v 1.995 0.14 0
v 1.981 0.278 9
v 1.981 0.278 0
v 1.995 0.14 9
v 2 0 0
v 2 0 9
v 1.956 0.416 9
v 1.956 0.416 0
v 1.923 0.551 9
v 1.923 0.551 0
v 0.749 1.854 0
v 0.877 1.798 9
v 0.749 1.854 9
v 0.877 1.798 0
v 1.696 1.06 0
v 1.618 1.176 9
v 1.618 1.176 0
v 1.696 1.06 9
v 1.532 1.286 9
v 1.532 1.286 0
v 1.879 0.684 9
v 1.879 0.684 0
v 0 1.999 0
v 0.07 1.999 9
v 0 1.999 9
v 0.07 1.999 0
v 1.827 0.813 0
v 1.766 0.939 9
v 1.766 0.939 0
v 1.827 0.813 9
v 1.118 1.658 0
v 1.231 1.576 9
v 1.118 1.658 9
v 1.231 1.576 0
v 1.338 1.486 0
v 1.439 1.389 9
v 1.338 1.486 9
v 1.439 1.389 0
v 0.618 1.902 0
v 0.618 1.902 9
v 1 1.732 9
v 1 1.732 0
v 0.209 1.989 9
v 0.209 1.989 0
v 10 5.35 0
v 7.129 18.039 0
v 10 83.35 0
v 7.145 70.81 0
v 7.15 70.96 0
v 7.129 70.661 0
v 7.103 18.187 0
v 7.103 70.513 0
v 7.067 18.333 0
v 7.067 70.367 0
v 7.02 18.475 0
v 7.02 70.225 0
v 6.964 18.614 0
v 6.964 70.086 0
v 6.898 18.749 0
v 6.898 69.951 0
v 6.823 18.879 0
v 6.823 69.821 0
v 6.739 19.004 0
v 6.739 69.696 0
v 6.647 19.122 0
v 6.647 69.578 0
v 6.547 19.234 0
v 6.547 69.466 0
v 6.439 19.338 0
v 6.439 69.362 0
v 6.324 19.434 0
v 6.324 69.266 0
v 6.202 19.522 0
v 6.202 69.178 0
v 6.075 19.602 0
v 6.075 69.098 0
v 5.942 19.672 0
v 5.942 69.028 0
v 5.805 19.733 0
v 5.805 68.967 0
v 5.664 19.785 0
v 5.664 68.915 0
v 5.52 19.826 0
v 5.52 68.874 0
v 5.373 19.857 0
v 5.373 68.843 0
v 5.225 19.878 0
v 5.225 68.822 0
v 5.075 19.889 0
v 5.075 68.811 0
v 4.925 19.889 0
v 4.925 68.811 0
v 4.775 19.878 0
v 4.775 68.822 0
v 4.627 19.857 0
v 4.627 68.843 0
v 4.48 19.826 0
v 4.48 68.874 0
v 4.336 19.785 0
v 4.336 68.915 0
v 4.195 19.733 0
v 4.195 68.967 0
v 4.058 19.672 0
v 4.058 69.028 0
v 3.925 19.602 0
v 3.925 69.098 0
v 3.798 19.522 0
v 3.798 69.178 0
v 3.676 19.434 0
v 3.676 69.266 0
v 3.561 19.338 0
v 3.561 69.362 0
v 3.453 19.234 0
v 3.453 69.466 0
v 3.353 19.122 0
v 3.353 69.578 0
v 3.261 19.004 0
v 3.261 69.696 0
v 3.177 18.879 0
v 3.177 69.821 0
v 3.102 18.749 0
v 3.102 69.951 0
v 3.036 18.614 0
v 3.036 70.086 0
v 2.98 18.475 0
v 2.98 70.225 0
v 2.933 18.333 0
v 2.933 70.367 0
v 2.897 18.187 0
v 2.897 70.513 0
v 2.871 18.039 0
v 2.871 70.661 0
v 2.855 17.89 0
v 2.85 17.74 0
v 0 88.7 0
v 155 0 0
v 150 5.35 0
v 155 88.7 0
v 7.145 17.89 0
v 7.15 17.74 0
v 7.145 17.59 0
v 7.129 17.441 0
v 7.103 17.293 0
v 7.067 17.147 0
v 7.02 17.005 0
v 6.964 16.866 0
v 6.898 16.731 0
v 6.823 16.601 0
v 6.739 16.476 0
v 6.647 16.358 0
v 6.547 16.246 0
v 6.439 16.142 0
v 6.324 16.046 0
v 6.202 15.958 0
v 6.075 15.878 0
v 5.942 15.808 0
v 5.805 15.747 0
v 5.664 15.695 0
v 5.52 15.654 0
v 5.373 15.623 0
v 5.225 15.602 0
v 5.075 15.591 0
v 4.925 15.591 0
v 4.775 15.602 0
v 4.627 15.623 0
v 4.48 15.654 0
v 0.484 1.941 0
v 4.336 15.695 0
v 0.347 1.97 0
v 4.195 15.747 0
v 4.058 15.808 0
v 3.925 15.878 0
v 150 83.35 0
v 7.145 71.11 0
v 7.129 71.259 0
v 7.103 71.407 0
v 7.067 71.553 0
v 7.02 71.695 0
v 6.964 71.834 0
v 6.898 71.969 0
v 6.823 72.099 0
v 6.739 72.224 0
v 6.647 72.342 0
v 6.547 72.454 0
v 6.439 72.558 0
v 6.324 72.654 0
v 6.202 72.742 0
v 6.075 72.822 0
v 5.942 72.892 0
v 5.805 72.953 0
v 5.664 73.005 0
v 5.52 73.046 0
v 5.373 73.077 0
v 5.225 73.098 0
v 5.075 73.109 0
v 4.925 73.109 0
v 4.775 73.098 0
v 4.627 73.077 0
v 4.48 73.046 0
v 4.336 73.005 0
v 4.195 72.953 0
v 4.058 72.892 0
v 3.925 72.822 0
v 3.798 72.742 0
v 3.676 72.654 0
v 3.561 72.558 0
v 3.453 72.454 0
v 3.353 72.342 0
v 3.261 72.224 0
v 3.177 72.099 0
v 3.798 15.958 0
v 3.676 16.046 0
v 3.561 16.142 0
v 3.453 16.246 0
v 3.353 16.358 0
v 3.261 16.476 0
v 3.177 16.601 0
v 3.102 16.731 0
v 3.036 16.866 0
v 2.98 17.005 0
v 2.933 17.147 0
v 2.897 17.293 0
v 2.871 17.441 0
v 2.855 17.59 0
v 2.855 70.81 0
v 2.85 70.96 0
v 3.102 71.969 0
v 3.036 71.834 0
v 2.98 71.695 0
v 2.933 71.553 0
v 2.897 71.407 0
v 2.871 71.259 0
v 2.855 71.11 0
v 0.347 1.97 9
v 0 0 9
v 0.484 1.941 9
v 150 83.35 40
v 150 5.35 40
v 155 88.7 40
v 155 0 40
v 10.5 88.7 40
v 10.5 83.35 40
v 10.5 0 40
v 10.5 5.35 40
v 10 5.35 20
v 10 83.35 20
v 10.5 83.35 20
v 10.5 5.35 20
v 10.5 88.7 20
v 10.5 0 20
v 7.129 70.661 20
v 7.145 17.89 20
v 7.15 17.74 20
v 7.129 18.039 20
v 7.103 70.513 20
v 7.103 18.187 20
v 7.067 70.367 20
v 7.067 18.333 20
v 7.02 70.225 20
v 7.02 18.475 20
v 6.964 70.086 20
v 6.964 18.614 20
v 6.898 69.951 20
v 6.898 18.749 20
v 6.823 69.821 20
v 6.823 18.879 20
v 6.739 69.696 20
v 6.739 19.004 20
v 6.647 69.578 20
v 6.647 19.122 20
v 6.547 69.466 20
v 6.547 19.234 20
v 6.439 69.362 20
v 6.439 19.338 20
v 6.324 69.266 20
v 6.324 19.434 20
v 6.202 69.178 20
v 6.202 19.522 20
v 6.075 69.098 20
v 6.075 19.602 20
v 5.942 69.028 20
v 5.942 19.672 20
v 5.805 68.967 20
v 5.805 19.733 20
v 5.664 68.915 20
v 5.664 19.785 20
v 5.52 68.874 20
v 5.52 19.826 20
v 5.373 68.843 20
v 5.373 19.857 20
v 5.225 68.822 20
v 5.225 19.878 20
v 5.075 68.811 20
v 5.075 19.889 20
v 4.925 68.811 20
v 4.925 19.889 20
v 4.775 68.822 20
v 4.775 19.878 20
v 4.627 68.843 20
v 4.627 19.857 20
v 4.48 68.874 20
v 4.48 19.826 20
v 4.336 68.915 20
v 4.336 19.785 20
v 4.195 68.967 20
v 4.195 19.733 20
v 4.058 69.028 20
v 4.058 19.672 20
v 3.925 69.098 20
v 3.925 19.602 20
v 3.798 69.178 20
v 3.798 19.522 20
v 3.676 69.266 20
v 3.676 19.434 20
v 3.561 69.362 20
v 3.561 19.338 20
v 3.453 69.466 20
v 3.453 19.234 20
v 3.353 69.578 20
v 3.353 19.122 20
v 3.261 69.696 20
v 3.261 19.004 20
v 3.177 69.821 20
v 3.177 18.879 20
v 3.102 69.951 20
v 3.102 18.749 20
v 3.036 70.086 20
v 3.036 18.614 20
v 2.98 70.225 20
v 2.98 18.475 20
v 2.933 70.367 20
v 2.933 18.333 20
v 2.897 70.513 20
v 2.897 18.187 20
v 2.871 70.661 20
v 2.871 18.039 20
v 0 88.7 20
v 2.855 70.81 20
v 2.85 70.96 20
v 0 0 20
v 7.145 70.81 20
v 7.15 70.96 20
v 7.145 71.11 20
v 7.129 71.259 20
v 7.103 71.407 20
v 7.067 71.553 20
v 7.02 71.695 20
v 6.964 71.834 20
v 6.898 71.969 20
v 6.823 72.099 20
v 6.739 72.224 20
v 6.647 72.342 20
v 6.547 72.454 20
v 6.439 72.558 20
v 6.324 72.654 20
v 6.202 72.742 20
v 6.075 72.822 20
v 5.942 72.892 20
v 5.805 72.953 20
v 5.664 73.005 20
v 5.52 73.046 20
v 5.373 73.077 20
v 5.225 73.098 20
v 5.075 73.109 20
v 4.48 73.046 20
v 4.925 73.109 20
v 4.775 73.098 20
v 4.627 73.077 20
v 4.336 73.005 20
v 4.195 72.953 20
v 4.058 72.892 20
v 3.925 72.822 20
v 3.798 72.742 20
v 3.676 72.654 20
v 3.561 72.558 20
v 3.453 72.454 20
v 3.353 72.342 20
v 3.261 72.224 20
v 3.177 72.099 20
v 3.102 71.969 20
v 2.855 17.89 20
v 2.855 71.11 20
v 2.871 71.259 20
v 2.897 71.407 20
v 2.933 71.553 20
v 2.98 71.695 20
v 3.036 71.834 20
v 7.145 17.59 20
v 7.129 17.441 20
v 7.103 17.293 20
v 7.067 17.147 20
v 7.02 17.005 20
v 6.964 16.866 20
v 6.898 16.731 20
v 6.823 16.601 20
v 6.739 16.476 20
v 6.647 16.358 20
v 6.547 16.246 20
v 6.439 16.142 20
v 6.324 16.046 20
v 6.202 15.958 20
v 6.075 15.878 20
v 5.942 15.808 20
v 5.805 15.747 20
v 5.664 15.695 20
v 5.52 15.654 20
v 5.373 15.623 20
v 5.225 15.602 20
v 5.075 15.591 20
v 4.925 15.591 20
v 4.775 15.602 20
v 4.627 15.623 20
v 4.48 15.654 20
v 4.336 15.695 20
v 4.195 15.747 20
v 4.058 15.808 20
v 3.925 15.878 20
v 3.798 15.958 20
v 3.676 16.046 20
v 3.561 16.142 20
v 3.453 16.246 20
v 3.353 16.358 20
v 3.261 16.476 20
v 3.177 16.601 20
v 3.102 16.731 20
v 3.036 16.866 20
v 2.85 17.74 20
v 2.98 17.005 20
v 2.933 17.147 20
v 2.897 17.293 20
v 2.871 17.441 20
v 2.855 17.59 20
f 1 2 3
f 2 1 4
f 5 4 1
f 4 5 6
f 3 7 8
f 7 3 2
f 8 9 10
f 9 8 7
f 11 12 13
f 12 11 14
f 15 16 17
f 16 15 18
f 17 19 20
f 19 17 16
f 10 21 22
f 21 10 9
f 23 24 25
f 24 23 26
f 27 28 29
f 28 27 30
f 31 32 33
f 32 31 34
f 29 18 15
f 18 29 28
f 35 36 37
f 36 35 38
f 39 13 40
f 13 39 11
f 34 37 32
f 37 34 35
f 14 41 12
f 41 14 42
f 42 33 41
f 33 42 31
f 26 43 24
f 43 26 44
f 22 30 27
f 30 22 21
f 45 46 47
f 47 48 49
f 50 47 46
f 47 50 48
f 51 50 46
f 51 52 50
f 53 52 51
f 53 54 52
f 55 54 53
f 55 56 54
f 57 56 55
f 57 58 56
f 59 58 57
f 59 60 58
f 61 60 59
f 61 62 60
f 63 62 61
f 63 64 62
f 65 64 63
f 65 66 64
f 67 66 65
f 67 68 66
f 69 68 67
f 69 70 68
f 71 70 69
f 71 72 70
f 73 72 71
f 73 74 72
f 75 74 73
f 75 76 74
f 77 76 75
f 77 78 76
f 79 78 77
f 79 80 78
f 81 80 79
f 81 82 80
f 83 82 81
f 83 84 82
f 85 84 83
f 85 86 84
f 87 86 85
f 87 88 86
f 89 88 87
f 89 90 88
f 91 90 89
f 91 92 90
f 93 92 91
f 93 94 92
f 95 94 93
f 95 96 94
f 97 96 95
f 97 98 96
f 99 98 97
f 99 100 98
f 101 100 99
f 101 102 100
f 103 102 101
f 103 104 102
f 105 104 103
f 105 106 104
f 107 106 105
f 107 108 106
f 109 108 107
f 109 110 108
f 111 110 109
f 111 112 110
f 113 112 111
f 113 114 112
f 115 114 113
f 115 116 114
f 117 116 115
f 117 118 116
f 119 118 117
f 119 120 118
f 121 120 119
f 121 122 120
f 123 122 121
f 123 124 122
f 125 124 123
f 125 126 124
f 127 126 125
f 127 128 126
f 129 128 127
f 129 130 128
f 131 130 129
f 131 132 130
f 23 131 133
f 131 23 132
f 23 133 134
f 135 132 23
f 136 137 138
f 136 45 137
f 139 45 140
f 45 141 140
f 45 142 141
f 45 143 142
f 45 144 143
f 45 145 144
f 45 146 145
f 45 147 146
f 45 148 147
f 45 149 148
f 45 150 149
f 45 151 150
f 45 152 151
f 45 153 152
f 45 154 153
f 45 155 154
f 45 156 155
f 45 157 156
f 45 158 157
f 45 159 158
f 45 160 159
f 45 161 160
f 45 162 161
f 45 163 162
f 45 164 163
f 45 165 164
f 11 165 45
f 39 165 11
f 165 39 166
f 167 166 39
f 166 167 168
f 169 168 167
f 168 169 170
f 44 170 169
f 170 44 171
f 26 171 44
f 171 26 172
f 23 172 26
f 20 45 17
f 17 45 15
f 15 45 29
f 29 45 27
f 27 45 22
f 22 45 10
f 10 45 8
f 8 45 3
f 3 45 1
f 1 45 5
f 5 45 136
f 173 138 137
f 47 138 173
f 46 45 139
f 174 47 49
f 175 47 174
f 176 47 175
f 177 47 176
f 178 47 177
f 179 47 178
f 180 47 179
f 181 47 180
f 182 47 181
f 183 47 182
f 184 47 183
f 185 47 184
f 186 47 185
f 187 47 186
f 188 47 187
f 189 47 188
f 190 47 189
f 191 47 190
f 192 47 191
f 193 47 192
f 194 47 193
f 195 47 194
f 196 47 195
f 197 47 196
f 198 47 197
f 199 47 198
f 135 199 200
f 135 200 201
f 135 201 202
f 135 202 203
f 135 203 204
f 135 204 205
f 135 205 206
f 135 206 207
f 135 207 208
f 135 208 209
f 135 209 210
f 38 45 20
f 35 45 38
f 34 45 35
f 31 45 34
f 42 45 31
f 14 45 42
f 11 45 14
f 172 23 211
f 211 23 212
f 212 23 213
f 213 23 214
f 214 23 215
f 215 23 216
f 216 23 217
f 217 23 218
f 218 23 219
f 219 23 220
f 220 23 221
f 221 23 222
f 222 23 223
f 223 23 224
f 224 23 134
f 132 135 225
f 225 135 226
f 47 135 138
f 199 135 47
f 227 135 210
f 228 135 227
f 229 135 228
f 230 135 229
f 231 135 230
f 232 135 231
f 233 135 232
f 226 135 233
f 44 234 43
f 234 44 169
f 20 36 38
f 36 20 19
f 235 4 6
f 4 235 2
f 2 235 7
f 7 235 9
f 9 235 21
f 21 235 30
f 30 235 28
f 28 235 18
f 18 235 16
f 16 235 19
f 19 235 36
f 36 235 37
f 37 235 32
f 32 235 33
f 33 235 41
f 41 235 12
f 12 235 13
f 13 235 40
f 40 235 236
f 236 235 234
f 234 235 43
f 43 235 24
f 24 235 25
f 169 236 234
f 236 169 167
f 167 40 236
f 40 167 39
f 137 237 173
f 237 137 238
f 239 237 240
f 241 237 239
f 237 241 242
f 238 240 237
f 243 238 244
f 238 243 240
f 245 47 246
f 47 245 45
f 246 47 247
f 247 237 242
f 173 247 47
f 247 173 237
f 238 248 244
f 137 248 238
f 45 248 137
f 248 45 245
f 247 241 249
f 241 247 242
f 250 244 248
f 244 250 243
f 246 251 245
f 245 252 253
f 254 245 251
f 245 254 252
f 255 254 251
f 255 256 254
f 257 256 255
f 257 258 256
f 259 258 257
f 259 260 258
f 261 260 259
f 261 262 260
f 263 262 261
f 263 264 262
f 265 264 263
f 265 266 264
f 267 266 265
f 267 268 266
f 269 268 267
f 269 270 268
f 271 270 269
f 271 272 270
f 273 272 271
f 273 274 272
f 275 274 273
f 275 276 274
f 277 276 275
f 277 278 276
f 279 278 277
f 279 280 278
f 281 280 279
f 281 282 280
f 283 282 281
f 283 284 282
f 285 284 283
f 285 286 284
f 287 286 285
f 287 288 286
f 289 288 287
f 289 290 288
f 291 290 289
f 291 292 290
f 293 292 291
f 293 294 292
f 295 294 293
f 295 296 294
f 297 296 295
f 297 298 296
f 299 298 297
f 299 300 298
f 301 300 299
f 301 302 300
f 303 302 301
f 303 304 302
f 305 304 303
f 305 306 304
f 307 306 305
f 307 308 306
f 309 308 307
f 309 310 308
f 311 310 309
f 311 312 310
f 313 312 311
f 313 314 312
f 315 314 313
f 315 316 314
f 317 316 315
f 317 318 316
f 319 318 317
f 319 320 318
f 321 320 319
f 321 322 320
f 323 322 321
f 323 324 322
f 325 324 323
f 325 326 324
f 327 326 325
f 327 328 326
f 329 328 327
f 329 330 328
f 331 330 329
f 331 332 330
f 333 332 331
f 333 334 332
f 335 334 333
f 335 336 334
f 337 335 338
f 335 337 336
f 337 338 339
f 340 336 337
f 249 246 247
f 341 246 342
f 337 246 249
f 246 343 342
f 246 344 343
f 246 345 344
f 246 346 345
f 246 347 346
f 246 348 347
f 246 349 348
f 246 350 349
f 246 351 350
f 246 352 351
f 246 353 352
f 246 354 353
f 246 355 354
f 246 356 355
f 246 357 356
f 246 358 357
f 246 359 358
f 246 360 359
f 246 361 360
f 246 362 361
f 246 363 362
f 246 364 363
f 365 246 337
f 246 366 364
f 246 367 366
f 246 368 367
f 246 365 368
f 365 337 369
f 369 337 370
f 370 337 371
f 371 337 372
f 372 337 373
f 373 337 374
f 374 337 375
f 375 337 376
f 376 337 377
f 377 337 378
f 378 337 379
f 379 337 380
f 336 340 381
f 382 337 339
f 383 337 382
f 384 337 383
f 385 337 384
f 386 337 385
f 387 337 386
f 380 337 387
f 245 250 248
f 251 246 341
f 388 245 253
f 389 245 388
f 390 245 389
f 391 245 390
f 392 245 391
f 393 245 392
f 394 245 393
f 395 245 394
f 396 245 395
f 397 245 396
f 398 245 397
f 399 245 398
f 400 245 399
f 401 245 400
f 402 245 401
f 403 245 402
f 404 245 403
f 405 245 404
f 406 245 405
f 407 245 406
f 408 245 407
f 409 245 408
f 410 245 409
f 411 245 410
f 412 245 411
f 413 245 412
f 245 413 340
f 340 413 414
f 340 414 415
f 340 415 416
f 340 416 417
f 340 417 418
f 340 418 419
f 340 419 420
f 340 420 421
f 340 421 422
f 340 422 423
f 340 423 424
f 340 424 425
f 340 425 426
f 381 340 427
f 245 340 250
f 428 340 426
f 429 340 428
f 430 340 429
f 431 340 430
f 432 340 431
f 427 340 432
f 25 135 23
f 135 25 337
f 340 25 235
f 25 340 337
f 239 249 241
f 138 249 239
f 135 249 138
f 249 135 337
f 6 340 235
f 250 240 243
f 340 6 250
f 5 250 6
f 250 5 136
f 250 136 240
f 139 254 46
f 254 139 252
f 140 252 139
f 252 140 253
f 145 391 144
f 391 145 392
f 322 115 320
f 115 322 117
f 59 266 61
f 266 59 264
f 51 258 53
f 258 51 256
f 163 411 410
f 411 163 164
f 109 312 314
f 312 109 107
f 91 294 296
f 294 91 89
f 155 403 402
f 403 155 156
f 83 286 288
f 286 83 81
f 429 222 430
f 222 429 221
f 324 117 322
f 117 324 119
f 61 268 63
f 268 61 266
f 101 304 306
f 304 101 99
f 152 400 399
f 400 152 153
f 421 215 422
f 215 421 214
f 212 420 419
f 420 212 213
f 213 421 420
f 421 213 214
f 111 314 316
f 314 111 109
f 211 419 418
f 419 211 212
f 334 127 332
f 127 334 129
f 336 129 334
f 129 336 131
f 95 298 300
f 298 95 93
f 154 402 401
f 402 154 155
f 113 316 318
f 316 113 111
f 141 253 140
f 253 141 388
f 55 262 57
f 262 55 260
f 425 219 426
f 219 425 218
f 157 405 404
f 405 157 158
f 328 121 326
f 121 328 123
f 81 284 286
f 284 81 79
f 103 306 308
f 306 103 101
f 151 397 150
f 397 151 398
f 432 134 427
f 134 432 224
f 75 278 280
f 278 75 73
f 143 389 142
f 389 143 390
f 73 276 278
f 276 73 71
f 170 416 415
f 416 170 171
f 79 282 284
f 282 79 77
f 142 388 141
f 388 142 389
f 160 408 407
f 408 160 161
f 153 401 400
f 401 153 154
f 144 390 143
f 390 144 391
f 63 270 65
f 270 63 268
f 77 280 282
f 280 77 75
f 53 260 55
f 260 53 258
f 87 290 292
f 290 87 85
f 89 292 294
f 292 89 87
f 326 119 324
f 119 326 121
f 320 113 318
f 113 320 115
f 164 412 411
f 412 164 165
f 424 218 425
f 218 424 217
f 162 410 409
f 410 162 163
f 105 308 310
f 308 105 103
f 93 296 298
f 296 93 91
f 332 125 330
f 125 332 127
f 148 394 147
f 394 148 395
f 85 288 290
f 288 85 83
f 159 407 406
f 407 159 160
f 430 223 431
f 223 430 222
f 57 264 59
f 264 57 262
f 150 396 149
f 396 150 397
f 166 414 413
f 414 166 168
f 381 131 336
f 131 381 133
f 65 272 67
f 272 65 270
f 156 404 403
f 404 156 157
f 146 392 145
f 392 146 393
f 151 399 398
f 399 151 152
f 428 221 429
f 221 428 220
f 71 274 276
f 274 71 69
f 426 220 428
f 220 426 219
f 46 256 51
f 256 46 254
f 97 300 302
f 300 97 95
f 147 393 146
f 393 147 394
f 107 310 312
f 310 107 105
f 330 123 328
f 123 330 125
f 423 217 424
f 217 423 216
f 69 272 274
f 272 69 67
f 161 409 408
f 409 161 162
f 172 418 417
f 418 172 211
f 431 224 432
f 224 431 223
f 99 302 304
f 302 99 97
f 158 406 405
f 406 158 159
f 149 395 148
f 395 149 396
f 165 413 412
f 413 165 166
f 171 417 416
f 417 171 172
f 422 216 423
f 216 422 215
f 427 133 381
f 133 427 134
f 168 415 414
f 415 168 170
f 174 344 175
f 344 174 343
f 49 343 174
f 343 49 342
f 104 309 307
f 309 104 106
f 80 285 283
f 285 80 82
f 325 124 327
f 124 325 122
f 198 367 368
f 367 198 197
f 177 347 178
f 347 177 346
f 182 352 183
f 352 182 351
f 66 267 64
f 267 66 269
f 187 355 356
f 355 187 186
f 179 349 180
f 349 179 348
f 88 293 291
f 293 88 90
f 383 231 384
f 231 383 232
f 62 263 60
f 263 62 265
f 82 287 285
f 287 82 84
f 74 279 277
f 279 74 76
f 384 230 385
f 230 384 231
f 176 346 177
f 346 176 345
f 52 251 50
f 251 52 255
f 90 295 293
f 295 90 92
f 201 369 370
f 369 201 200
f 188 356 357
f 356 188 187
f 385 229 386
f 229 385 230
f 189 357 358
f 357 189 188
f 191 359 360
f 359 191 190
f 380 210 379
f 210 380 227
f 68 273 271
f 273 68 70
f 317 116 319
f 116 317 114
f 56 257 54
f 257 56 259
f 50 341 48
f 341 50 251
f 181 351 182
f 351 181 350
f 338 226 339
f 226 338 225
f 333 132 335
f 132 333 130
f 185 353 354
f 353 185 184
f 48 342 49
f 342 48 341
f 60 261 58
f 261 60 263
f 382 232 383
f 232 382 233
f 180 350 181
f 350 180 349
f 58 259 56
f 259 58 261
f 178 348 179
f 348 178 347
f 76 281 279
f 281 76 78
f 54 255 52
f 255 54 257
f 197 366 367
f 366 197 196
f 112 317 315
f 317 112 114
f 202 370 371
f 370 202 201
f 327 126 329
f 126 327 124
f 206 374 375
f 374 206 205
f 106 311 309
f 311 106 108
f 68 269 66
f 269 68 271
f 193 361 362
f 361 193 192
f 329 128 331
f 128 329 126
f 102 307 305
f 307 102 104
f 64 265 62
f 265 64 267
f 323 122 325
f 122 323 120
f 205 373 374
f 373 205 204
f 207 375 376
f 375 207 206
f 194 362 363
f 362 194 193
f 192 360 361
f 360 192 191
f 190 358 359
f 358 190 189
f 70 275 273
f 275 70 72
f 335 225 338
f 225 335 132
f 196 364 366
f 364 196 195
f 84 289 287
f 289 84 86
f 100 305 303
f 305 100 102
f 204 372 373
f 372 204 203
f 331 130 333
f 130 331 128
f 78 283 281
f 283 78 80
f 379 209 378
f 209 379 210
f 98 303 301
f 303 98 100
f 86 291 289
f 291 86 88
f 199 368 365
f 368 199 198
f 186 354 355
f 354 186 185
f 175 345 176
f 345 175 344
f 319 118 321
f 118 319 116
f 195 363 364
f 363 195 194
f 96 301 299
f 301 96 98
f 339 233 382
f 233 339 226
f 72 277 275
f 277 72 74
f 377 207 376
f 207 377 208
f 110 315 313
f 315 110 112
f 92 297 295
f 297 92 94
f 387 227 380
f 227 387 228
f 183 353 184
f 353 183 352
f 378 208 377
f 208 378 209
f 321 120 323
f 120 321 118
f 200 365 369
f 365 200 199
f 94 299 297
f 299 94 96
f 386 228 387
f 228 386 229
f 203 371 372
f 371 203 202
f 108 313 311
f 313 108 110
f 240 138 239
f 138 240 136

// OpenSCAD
// file: ../utils/server-rack-node-case/case-generic.scad
/* caseGeneric
    Used by `caseSide` and `caseMiddle` to generate 
    a basic case with monting holes, e.g., for ssd or Pi.

    cwi: case width inner
    cwo: case width outer
    chi: case height inner
    cho: case height outer
    cdt: case depth thickenss
    npc: node per case
    dbnh: distance between node holes
    isSide: 
*/
module caseGeneric(cwi,cwo,chi,cho,cdt,npc,dbnh, isSide=true){
    nt = cwi/npc;  // Node thicknes

    hwt = (cho-chi)/2; // horizontal wall thickness
    vwt = (cwo-cwi)/2; // vertical wall thickness
    vwtt = vwt*2; // vertical wall thickness total
    cwt = cwo+vwt*2; // case width total
    dnmh = 4; // diameter node mounting hole
    hnmh = 9; // height node mounting hole
    dcmh = 4.3; // diameter case mounting hole
    mcc = 0.5; // margin for connecting cases

    module nodeMountingHoles(){
        for(i=[1:2:npc*2]){
            // Buttom holes
            translate([vwtt+(nt/2)*i,(cho-dbnh)/2,0])
            cylinder(d=dnmh, h=hnmh);

            // Top holes 
            translate([vwtt+(nt/2)*i,(cho+dbnh)/2,0])
            cylinder(d=dnmh, h=hnmh);
        }
    }
    
    difference(){
        union(){
            if (isSide)
            {
              cube([cwt-vwt,cho,cdt]);
            }
            else
            {
              cube([cwt,cho,cdt]);
            }
        }
        union(){
            // Inner cutout
            translate([vwtt,hwt,0])
            cube([cwi,chi,cdt]);
            
            // Cutout for connecting cases
            translate([0,0,cdt/2])
            cube([vwtt+mcc,cho,cdt/2]);

            translate([vwt,cho/5,0])
            cylinder(d=dcmh, h=cdt);
            translate([vwt,cho/5*4,0])
            cylinder(d=dcmh, h=cdt);

            if (isSide)
            {
                nodeMountingHoles();
            }
            else
            {
                translate([0,0,cdt-hnmh])
                nodeMountingHoles();

                translate([cwo-mcc,0,cdt/2])
                cube([vwtt+mcc,cho,cdt/2]);

                translate([cwt-vwt,cho/5,0])
                cylinder(d=dcmh, h=cdt);
                translate([cwt-vwt,cho/5*4,0])
                cylinder(d=dcmh, h=cdt);
            }
        }
    }
}
// file: ../utils/server-rack-node-case/case-middle.scad
use <case-generic.scad>;

/* caseMiddle
    The rack case is in three parts left side case,
    middle case, and right side case.
    The middle case is the one without rack mounts on sides. 

    cwi: case width inner
    cwo: case width outer
    chi: case height inner
    cho: case height outer
    cdt: case depth thickenss
    npc: node per case
*/
module caseMiddle(cwi,cwo,chi,cho,cdt,npc){
    // -2 since it wont fit otherwise
    cwoa = cwo-2; // case width outer actual
    cwia = cwi; // case width inner actual
    cst = (cwoa-cwia)/2; // case side thickness

    hdc = 4; // hole diameter for mointing to middle case

    caseGeneric(cwi,cwo,chi,cho,cdt,npc,false);
}
 
// file: ../utils/constants.scad
$fn=90;  // accuracy

/* Server dimentions */

// one server unit
c_1u = 44.45;  

// two server unit
c_2u = c_1u*2; // 88.9

// total width
// The total with of the a server rack (19")
// this includes the mounting holes
c_tw  = 482.6; 

// Total inner width
// The distance between the mounting holes in the server rack
c_tiw = 450;


/* Rack hole dimentions */

// width distance rack holes
c_wdrh = 465;

// height distance rack holes
c_hdrh = 33;


/* dell optiplex 7040 micro usff dimentions */

// dell optiplex 7040 height
c_do7040h = 36;

// dell optiplex 7040 width
c_do7040w = 182;

// dell optiplex 7040 depth
c_do7040d = 179;

// dell optiplex 7040 rubber feet width distance
c_do7040rfwd = 14.9;

// dell optiplex 7040 rubber feet back depth distance
c_do7040rfbdd = 9.9;


/* Case dimentions */

// case height outer 
// A small margin is included to so that the case does not 
// exide two server units
c_2ucho = c_2u-0.2; 

// case height inner
// The thickness of the walls can then be calculated as (cho-chi)/2
c_2uchi = 78;

// case width outer
// as there are three parts of the rack server case we just devide
// the total inner width with three 
c_cwo = c_tiw/3; // 150

// case width inner
// Needs to be less than case width outer
c_cwi = 140;

// case depth thickness
// How thick the case should be. It needs to be thicker than the hight
// of the threaded insert.
c_cdt = 40;

// case inner side thickness
// The middle and the side case over lap so that a screw can be entered
// between the two cases. The cist is defined as the thickness of the part
// that does not overlap between the midle and side case.
c_cist = 3.5;

// nodes per case
c_npc = 7;
// main file
include <../utils/constants.scad>;
use <../utils/server-rack-node-case/case-middle.scad>;

caseMiddle(c_cwi,c_cwo,c_2uchi,c_2ucho,c_cdt,c_npc);
